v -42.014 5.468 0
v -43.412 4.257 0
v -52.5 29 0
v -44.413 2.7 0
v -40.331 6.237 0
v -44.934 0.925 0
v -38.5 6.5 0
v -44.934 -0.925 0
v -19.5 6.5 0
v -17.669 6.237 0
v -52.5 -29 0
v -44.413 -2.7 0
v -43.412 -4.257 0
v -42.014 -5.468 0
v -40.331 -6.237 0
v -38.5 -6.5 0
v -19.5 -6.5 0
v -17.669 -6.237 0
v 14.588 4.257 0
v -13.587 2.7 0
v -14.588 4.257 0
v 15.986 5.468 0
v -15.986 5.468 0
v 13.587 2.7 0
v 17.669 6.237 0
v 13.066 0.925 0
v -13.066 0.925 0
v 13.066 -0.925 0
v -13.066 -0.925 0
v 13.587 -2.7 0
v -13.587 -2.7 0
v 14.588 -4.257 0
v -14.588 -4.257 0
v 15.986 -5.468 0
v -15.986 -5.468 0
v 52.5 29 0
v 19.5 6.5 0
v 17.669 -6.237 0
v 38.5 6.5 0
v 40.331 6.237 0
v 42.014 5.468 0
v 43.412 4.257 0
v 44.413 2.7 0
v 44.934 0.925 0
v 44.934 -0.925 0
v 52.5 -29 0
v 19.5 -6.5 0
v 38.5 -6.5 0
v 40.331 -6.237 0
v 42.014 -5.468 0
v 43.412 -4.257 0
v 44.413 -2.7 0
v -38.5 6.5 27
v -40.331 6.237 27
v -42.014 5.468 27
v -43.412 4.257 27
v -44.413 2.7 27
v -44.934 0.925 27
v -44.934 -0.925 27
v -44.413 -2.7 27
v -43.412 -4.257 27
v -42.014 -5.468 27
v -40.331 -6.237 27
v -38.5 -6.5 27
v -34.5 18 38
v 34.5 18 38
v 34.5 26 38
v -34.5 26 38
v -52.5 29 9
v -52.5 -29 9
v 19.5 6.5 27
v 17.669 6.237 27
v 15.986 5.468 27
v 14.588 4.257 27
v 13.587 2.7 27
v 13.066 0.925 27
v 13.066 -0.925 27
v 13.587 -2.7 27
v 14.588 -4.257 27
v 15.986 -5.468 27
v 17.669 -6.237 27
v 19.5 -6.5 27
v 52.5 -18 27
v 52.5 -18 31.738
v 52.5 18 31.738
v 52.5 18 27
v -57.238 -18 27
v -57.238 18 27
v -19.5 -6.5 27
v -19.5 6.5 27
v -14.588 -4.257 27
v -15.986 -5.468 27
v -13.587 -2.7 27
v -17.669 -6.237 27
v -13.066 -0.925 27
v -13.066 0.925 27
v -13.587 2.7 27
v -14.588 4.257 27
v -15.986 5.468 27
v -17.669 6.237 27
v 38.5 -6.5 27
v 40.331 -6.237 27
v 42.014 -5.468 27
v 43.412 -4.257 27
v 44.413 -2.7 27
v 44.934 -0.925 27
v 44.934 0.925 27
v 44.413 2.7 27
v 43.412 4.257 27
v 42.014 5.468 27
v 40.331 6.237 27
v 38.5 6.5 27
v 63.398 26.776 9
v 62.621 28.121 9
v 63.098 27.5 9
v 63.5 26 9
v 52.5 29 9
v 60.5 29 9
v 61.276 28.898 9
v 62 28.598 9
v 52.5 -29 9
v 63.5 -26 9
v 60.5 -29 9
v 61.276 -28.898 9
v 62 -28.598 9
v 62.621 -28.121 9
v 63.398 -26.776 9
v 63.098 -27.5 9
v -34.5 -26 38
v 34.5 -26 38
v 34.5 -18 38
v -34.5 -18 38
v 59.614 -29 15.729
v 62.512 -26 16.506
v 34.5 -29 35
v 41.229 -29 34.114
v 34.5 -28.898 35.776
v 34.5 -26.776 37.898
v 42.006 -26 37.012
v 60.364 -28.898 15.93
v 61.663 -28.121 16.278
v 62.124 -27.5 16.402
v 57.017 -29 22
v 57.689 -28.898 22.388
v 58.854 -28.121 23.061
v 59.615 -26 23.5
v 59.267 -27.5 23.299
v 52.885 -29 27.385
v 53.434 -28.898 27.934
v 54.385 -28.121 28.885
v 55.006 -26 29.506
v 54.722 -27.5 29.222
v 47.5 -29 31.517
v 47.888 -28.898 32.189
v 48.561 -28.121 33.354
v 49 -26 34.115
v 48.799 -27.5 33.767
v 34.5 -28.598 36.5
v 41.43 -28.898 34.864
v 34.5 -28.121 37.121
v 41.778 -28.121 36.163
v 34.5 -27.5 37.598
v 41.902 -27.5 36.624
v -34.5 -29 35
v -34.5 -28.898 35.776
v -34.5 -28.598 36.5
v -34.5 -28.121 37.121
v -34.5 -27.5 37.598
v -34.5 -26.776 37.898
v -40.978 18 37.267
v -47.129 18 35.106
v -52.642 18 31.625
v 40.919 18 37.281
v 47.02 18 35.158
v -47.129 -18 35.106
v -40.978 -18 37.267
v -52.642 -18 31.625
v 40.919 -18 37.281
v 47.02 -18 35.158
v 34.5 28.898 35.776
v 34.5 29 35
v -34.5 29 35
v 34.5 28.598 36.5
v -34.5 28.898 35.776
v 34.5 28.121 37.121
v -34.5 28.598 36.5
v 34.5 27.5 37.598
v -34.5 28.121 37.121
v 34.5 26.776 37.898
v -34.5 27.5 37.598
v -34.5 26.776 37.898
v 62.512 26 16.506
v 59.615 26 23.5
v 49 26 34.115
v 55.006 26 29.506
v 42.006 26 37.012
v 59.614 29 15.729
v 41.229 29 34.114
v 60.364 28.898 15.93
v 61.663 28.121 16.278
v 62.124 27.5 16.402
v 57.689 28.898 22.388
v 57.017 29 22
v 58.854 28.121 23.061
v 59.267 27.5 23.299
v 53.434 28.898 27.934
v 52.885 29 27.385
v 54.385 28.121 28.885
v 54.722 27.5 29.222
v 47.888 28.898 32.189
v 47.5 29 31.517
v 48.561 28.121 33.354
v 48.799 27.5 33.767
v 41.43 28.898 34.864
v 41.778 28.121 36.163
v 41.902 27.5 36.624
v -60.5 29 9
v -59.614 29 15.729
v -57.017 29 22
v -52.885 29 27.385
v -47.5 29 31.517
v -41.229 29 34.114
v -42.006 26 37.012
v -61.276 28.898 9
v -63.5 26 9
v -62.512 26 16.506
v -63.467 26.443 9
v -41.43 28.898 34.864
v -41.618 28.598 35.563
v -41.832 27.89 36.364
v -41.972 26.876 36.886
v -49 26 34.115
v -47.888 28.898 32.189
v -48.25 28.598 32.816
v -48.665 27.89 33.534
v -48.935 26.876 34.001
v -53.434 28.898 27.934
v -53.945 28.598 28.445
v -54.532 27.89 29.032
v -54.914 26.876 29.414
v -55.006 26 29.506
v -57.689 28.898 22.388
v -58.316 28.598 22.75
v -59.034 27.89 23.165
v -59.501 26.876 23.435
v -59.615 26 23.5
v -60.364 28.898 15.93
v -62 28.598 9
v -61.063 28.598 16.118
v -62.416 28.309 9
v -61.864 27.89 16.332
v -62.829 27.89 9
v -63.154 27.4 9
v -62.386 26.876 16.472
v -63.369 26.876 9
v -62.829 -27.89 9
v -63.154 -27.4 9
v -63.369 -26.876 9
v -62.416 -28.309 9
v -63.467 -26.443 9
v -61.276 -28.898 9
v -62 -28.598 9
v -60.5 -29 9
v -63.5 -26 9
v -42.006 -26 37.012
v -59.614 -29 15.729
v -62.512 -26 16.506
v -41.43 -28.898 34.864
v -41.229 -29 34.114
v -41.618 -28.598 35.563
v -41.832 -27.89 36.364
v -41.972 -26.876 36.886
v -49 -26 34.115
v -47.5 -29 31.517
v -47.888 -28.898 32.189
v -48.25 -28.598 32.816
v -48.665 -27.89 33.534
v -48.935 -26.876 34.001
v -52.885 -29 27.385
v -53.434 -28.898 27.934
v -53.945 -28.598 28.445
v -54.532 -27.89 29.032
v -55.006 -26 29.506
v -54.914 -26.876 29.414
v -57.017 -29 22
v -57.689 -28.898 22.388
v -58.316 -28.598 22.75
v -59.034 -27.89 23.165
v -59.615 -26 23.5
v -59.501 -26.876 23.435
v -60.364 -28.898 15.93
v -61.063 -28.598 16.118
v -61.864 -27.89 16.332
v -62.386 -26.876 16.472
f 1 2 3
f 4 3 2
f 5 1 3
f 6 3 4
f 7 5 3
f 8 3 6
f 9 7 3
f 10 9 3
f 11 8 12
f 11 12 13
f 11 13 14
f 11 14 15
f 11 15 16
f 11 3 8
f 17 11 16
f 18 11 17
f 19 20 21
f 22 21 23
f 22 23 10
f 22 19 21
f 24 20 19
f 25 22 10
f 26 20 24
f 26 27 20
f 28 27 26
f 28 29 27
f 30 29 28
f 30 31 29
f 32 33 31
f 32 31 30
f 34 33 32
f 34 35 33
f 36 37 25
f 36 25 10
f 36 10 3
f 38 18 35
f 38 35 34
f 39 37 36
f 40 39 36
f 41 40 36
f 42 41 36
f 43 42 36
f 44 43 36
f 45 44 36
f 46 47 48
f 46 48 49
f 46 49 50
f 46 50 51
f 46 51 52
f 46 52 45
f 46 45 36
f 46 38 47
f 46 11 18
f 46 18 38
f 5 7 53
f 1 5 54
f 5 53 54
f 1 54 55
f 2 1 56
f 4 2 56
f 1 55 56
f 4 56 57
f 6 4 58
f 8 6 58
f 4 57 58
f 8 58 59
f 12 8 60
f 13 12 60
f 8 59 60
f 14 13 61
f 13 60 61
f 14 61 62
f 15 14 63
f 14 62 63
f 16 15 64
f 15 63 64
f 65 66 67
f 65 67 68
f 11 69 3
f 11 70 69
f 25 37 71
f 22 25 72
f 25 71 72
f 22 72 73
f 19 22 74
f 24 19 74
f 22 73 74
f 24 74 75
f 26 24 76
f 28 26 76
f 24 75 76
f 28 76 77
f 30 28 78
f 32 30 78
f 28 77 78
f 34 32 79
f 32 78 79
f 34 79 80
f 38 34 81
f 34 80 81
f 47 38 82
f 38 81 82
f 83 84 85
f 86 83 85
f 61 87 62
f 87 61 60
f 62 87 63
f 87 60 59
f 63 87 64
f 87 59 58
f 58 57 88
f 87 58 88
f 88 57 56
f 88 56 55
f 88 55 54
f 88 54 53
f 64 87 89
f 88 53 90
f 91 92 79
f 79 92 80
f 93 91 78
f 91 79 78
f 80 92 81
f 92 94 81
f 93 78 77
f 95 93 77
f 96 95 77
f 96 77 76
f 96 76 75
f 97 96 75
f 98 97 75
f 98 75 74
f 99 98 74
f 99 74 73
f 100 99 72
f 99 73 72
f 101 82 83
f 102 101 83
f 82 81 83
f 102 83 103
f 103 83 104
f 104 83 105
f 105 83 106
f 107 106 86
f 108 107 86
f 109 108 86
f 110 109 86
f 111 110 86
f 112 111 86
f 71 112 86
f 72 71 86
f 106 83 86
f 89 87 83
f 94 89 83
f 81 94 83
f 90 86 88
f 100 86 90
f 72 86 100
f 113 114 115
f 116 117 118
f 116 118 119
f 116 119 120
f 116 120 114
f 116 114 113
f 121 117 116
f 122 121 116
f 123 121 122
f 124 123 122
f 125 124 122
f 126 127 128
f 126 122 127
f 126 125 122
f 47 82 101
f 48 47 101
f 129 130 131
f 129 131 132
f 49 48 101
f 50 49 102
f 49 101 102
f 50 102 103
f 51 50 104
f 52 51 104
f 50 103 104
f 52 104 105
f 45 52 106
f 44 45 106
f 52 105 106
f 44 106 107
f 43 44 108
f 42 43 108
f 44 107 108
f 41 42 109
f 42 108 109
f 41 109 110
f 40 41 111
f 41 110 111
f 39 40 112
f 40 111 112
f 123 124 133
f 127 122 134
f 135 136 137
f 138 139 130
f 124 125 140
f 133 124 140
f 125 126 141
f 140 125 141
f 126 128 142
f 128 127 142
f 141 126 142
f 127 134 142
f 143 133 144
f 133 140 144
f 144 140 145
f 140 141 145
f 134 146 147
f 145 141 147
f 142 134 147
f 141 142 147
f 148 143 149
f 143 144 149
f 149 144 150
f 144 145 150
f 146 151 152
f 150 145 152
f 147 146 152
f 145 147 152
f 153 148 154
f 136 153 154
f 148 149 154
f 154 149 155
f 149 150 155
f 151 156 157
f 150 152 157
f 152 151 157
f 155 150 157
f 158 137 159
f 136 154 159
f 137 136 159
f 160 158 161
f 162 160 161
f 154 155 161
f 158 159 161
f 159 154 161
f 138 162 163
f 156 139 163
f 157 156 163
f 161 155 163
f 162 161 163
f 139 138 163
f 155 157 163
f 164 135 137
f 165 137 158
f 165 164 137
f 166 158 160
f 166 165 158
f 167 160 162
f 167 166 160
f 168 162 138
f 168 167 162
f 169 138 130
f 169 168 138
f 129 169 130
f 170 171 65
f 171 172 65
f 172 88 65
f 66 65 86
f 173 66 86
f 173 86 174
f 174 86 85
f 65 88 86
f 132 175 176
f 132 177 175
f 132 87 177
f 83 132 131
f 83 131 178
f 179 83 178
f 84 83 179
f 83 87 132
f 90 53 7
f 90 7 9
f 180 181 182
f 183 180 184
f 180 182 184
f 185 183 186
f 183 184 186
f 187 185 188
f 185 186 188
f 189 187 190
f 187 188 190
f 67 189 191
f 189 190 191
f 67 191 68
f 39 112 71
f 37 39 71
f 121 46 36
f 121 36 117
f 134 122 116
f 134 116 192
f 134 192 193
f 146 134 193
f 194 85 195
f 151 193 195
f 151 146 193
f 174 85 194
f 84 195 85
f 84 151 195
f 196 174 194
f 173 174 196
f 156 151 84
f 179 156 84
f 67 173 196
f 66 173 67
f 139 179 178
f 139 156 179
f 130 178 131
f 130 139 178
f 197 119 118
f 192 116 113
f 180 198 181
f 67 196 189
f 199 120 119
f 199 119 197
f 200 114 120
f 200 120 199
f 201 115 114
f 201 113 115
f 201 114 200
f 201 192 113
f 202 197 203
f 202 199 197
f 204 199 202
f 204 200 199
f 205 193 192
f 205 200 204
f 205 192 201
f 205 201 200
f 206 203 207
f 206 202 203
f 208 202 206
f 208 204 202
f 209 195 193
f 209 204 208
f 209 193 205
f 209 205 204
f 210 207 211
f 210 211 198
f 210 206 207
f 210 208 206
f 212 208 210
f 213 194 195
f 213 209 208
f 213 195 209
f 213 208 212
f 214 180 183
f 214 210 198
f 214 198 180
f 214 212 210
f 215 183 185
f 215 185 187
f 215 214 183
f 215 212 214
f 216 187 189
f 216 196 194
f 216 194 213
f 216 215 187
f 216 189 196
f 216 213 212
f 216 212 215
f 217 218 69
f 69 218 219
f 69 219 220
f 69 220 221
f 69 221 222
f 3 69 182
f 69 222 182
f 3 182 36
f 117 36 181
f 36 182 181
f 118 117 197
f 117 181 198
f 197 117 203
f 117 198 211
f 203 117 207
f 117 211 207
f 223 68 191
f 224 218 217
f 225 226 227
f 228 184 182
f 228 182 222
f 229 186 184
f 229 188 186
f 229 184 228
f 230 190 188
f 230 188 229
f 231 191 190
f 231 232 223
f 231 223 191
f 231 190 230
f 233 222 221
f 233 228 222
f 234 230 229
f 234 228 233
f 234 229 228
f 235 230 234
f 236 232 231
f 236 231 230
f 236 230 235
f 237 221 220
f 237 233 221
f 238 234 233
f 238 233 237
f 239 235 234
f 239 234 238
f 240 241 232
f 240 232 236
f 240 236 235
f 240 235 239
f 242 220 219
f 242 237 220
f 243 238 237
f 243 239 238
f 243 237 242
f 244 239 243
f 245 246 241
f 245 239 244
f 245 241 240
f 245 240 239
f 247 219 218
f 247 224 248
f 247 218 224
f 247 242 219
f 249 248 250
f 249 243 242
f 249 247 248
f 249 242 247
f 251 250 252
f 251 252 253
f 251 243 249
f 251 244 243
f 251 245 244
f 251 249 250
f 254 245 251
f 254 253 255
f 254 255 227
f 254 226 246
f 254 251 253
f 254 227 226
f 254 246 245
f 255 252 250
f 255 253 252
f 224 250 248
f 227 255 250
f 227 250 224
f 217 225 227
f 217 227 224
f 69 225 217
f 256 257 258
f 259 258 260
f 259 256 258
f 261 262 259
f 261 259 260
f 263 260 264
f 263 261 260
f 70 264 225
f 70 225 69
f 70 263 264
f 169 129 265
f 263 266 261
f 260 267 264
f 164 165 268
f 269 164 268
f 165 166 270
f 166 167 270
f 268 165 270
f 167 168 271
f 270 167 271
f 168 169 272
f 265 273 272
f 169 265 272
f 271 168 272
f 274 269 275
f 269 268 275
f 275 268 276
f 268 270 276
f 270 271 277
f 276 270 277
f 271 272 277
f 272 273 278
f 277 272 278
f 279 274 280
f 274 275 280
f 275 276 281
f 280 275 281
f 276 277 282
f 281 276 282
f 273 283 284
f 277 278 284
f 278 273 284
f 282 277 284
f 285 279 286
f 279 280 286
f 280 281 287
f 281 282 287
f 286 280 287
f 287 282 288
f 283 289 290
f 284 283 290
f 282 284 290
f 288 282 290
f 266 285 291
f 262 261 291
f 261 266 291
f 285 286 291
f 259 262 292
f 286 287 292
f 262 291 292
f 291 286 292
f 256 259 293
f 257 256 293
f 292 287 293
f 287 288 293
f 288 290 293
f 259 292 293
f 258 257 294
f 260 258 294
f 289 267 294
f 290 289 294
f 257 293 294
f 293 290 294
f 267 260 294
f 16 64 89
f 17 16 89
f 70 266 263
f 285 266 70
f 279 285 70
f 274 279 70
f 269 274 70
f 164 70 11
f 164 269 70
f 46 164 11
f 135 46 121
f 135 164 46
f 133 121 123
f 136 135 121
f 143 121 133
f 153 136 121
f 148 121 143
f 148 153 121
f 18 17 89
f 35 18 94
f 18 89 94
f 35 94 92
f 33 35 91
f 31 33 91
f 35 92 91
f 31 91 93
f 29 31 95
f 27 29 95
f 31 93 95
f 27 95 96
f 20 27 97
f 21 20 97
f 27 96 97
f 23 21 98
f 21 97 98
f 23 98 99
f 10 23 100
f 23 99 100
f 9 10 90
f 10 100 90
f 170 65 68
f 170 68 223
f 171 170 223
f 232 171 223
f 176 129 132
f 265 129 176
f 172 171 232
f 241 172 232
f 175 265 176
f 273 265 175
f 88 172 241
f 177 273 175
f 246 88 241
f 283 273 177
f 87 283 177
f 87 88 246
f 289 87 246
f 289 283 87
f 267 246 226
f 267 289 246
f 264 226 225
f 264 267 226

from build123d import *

# Parameters (mm, degrees)
F1_DEPTH = 29
F2_W     = 36
F2_H     = 11
F3_DEPTH = 116.001
F4_R     = 3
F5_W     = 19
F5_H     = 13
F6_DEPTH = 27.001


with BuildPart() as f1:
    # F0 (on Front) → F1 (new body, symmetric)
    with BuildSketch(Plane.XZ):
        with BuildLine():
            Line((-52.5, 0), (0, 0))
            Line((0, 0), (52.5, 0))
            Line((52.5, 0), (52.5, 9))
            Line((52.5, 9), (63.5, 9))
            ThreePointArc((63.5, 9), (55.006097, 29.506097), (34.5, 38))
            Line((34.5, 38), (0, 38))
            Line((0, 38), (-34.5, 38))
            ThreePointArc((-34.5, 38), (-55.006097, 29.506097), (-63.5, 9))
            Line((-63.5, 9), (-52.5, 9))
            Line((-52.5, 9), (-52.5, 0))
        make_face()
    extrude(amount=F1_DEPTH, both=True)

    # F2 (on face) → F3 (cut, through all)
    with BuildSketch(Plane.YZ.offset(52.5)):
        with Locations((0, 32.5)):
            Rectangle(F2_W, F2_H)
    extrude(amount=-F3_DEPTH, mode=Mode.SUBTRACT)

    # F4
    f4_edges = [f1.edges().sort_by_distance(p)[0] for p in [
        (0, 29, 38),
        (0, -29, 38),
    ]]
    fillet(f4_edges, radius=F4_R)

    # F5 (on face) → F6 (cut, through all)
    with BuildSketch(Plane.XY.offset(27)):
        with BuildLine():
            ThreePointArc((-38.5, 6.5), (-45, 0), (-38.5, -6.5))
            Line((-38.5, -6.5), (-38.5, 6.5))
        make_face()
        with Locations((-29, 0)):
            Rectangle(F5_W, F5_H)
        with BuildLine():
            Line((-19.5, 6.5), (-19.5, -6.5))
            ThreePointArc((-19.5, -6.5), (-13, 0), (-19.5, 6.5))
        make_face()
        with BuildLine():
            ThreePointArc((38.5, -6.5), (45, 0), (38.5, 6.5))
            Line((38.5, 6.5), (19.5, 6.5))
            ThreePointArc((19.5, 6.5), (13, 0), (19.5, -6.5))
            Line((19.5, -6.5), (38.5, -6.5))
        make_face()
    extrude(amount=-F6_DEPTH, mode=Mode.SUBTRACT)


solid = f1.part
